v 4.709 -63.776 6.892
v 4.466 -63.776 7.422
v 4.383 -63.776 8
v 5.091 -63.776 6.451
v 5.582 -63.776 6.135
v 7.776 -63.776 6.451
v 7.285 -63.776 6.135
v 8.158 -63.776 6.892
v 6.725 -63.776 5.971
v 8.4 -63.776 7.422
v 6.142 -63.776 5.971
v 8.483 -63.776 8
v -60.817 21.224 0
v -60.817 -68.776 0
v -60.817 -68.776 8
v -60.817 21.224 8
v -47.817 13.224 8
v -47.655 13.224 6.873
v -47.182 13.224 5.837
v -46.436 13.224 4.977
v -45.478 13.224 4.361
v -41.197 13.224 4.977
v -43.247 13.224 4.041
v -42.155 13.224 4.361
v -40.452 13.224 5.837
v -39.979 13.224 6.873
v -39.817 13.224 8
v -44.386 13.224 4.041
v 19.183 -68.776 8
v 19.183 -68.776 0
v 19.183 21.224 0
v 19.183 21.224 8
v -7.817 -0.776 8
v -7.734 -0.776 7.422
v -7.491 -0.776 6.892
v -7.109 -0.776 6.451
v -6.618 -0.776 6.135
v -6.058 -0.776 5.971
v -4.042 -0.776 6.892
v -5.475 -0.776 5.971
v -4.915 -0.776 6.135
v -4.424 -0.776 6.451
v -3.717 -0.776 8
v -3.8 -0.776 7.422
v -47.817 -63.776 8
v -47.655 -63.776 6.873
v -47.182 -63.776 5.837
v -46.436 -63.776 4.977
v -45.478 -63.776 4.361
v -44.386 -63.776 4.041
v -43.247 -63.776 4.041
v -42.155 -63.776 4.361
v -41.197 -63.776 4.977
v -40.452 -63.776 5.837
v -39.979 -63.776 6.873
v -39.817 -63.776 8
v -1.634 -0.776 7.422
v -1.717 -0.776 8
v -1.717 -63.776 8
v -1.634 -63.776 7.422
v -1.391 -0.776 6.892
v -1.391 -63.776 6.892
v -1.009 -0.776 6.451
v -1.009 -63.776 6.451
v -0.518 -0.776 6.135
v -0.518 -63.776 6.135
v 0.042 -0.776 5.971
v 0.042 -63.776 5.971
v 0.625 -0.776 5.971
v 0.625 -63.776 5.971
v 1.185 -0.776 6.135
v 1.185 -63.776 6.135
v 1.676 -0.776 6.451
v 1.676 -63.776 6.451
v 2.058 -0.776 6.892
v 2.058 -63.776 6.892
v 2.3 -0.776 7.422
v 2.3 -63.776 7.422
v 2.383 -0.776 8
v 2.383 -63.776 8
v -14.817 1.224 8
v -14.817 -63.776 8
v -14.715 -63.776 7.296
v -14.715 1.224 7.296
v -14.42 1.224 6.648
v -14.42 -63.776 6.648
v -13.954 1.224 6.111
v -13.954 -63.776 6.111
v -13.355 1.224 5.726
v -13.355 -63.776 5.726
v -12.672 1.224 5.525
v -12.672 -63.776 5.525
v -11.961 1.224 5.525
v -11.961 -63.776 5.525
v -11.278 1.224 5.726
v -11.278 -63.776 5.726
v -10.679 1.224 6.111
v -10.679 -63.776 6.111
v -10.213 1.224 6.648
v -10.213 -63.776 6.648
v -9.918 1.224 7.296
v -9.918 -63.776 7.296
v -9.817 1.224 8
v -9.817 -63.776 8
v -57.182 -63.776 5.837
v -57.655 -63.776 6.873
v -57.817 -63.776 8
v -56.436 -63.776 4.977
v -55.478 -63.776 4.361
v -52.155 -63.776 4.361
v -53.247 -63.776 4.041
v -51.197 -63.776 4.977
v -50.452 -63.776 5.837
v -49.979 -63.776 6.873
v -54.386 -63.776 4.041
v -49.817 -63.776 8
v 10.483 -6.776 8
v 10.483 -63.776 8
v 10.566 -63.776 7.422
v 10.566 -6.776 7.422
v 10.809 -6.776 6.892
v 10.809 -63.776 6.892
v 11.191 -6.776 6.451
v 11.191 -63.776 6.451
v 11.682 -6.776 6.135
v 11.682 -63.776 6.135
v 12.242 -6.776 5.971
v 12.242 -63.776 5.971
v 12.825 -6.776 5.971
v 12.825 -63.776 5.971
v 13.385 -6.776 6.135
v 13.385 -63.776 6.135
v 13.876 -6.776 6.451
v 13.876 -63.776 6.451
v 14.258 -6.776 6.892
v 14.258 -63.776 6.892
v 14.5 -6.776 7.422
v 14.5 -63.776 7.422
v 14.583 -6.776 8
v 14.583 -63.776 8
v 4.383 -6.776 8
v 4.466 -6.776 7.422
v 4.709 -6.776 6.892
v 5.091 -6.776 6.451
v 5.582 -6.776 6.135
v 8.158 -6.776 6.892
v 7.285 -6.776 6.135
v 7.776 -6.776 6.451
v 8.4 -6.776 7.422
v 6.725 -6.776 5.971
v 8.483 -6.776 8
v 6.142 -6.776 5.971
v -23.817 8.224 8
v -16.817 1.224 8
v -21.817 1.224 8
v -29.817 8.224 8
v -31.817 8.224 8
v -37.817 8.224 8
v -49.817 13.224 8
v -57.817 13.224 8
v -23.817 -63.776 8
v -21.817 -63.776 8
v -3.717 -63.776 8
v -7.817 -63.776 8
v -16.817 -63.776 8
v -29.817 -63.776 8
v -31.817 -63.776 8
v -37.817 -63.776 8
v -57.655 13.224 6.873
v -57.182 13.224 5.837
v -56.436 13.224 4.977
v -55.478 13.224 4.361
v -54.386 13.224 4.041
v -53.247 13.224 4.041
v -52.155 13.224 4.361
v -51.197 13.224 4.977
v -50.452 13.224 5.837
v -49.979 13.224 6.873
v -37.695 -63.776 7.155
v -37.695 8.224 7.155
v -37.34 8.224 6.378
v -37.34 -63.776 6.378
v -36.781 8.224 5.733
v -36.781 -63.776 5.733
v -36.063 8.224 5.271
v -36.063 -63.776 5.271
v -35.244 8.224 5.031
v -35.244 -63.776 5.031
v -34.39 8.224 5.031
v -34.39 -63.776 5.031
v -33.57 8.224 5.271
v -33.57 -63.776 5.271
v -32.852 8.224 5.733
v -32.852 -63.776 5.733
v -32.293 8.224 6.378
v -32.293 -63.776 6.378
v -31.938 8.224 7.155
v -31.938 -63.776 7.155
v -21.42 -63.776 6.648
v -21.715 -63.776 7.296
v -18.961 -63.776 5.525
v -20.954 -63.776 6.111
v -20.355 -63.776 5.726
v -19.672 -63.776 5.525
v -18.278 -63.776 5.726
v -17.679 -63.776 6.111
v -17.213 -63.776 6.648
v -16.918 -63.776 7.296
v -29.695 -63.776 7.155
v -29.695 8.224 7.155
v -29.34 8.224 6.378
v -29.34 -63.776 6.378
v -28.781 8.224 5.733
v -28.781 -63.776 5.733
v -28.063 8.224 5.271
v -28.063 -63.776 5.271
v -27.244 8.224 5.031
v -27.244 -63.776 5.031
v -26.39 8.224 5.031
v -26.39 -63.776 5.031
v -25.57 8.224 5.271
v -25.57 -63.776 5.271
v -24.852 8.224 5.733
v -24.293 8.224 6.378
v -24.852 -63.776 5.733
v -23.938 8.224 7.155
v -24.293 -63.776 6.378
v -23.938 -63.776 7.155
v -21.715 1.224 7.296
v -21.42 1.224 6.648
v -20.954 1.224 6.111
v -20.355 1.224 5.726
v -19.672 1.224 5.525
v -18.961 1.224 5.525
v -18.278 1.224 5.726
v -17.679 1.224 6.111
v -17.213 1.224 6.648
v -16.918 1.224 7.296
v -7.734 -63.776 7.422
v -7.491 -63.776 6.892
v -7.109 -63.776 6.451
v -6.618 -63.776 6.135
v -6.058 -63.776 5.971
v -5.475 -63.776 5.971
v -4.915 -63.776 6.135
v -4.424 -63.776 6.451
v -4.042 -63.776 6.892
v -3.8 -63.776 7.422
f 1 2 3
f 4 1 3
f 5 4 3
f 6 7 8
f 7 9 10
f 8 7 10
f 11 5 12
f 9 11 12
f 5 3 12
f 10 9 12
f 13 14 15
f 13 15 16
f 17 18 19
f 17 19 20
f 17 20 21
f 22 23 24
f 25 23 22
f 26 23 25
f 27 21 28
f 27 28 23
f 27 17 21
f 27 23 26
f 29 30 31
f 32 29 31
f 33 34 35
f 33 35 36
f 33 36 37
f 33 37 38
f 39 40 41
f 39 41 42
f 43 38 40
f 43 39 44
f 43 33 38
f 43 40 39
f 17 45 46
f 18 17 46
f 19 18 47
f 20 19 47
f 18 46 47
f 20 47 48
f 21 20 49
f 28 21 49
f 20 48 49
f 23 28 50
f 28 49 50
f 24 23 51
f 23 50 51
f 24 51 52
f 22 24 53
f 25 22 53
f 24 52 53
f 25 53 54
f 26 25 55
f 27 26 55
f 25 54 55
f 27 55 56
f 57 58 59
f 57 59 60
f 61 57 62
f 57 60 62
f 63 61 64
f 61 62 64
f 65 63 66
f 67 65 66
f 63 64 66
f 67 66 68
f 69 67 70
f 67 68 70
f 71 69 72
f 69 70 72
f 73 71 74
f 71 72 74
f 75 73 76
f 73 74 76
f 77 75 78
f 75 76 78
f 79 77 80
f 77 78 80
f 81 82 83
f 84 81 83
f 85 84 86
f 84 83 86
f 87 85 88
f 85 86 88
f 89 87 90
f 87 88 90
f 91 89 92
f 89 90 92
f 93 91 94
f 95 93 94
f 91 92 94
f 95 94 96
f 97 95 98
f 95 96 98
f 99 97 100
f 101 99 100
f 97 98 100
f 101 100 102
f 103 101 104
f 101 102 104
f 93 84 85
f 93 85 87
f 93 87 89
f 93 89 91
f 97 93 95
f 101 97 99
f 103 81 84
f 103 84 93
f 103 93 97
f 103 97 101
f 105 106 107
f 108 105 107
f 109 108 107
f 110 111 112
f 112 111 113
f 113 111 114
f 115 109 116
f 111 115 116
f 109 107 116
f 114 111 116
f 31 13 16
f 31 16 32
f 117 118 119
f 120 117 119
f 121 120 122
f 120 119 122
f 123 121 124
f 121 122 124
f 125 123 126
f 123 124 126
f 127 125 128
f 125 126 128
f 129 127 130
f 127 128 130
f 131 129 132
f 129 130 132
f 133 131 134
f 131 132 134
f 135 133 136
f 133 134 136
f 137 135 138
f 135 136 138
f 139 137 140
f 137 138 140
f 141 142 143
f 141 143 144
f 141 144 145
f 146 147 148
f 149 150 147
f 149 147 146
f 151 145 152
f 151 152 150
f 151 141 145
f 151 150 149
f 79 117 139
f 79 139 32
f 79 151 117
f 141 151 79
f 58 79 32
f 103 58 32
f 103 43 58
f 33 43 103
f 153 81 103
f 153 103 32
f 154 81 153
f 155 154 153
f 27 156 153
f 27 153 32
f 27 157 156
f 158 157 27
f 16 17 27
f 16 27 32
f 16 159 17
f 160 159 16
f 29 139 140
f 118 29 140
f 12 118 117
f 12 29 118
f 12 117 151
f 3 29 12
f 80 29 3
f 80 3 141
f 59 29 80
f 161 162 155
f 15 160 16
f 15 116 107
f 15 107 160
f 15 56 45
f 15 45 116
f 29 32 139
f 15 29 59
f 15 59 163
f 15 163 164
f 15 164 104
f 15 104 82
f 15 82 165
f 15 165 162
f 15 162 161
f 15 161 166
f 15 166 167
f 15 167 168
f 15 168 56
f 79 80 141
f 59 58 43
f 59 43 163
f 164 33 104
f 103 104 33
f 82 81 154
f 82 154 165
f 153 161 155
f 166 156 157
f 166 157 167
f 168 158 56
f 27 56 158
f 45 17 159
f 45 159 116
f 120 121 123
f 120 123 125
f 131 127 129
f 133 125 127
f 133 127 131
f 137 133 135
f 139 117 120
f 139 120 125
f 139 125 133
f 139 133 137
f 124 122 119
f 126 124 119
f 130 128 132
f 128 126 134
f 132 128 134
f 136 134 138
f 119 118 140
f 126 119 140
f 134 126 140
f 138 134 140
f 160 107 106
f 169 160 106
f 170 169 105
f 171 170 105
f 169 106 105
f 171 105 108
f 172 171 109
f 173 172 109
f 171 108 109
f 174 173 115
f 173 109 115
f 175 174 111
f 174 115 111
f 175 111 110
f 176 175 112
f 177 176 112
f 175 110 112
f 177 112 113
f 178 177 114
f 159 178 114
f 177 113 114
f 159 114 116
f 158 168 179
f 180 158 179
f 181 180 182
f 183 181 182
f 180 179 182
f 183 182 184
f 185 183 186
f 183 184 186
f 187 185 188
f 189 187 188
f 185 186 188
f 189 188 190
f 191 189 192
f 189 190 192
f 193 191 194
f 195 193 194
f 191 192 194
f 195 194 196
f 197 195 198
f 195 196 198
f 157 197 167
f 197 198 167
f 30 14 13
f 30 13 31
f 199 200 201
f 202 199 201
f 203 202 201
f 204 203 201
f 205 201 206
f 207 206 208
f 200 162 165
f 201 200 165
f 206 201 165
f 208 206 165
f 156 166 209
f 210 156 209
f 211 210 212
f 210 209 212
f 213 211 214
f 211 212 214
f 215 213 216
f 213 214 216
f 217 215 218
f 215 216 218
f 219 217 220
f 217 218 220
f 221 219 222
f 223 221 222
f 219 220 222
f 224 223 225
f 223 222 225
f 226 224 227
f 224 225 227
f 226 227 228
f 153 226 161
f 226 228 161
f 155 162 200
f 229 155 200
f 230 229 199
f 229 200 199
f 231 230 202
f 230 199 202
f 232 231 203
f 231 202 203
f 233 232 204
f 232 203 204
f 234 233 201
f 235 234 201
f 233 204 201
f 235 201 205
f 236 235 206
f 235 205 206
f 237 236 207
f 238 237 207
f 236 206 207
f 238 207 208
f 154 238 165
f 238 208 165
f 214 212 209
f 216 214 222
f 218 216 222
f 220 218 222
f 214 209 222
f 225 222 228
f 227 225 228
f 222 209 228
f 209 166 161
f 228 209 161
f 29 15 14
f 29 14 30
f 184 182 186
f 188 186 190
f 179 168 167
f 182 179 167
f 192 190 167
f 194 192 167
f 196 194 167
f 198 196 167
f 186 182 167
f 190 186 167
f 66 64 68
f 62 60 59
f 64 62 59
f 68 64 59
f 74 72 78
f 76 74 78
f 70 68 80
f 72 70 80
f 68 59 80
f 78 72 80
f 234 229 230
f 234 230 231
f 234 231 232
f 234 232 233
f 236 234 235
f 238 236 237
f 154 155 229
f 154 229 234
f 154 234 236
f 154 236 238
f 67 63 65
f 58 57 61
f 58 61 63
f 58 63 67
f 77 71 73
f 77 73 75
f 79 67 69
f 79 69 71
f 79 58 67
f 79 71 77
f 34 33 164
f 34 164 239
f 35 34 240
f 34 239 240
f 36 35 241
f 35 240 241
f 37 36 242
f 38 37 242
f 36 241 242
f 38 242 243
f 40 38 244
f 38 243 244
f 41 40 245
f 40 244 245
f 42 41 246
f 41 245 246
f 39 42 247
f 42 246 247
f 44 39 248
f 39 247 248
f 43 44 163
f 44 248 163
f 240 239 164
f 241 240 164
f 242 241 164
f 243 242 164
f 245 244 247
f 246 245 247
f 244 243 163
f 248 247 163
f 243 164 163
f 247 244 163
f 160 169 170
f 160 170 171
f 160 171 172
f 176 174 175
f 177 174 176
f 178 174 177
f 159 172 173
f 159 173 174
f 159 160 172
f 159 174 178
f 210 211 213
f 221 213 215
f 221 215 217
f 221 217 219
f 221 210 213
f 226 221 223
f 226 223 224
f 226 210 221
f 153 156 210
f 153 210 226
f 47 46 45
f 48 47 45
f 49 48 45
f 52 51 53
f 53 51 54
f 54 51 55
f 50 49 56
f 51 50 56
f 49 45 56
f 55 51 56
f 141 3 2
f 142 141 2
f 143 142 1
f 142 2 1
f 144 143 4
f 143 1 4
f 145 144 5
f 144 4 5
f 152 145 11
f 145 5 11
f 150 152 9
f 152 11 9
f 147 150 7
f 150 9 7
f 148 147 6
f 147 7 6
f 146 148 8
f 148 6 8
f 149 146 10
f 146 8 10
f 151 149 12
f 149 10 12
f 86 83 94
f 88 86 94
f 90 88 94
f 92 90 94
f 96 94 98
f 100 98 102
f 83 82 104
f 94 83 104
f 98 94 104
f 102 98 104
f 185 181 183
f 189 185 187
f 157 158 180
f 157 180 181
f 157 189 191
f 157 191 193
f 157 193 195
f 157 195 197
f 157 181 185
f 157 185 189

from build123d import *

# Parameters (mm, degrees)
F0_W     = 80
F0_H     = 90
F1_DEPTH = 8
F3_DEPTH = 82
F4_DEPTH = 77
F5_DEPTH = 70
F6_DEPTH = 68
F7_DEPTH = 62
F8_DEPTH = 5


with BuildPart() as f1:
    # F0 (on Top) → F1 (new body)
    with BuildSketch(Plane.XY):
        with Locations((-20.8165652305, -23.7756354961)):
            Rectangle(F0_W, F0_H)
    extrude(amount=F1_DEPTH)

    # F2 (on face) → F3 (cut)
    with BuildSketch(Plane.XZ.offset(68.7756354961)):
        with BuildLine():
            ThreePointArc((-57.8165652305, 8), (-53.8165652305, 4), (-49.8165652305, 8))
            Line((-49.8165652305, 8), (-57.8165652305, 8))
        make_face()
        with BuildLine():
            Line((-39.8165652305, 8), (-47.8165652305, 8))
            ThreePointArc((-47.8165652305, 8), (-43.8165652305, 4), (-39.8165652305, 8))
        make_face()
    extrude(amount=-F3_DEPTH, mode=Mode.SUBTRACT)

    # F2 (on face) → F4 (cut)
    with BuildSketch(Plane.XZ.offset(68.7756354961)):
        with BuildLine():
            Line((-31.8165652305, 8), (-37.8165652305, 8))
            ThreePointArc((-37.8165652305, 8), (-34.8165652305, 5), (-31.8165652305, 8))
        make_face()
        with BuildLine():
            Line((-23.8165652305, 8), (-29.8165652305, 8))
            ThreePointArc((-29.8165652305, 8), (-26.8165652305, 5), (-23.8165652305, 8))
        make_face()
    extrude(amount=-F4_DEPTH, mode=Mode.SUBTRACT)

    # F2 (on face) → F5 (cut)
    with BuildSketch(Plane.XZ.offset(68.7756354961)):
        with BuildLine():
            Line((-16.8165652305, 8), (-21.8165652305, 8))
            ThreePointArc((-21.8165652305, 8), (-19.3165652305, 5.5), (-16.8165652305, 8))
        make_face()
        with BuildLine():
            Line((-9.8165652305, 8), (-14.8165652305, 8))
            ThreePointArc((-14.8165652305, 8), (-12.3165652305, 5.5), (-9.8165652305, 8))
        make_face()
    extrude(amount=-F5_DEPTH, mode=Mode.SUBTRACT)

    # F2 (on face) → F6 (cut)
    with BuildSketch(Plane.XZ.offset(68.7756354961)):
        with BuildLine():
            Line((-3.7165652305, 8), (-7.8165652305, 8))
            ThreePointArc((-7.8165652305, 8), (-5.7665652305, 5.95), (-3.7165652305, 8))
        make_face()
        with BuildLine():
            ThreePointArc((-1.7165652305, 8), (0.3334347695, 5.95), (2.3834347695, 8))
            Line((2.3834347695, 8), (-1.7165652305, 8))
        make_face()
    extrude(amount=-F6_DEPTH, mode=Mode.SUBTRACT)

    # F2 (on face) → F7 (cut)
    with BuildSketch(Plane.XZ.offset(68.7756354961)):
        with BuildLine():
            ThreePointArc((4.3834347695, 8), (6.4334347695, 5.95), (8.4834347695, 8))
            Line((8.4834347695, 8), (4.3834347695, 8))
        make_face()
        with BuildLine():
            ThreePointArc((10.4834347695, 8), (12.5334347695, 5.95), (14.5834347695, 8))
            Line((14.5834347695, 8), (10.4834347695, 8))
        make_face()
    extrude(amount=-F7_DEPTH, mode=Mode.SUBTRACT)

    # F2 (on face) → F8 (join)
    with BuildSketch(Plane.XZ.offset(68.7756354961)):
        with BuildLine():
            ThreePointArc((-57.8165652305, 8), (-53.8165652305, 4), (-49.8165652305, 8))
            Line((-49.8165652305, 8), (-57.8165652305, 8))
        make_face()
        with BuildLine():
            Line((-39.8165652305, 8), (-47.8165652305, 8))
            ThreePointArc((-47.8165652305, 8), (-43.8165652305, 4), (-39.8165652305, 8))
        make_face()
        with BuildLine():
            Line((-31.8165652305, 8), (-37.8165652305, 8))
            ThreePointArc((-37.8165652305, 8), (-34.8165652305, 5), (-31.8165652305, 8))
        make_face()
        with BuildLine():
            Line((-23.8165652305, 8), (-29.8165652305, 8))
            ThreePointArc((-29.8165652305, 8), (-26.8165652305, 5), (-23.8165652305, 8))
        make_face()
        with BuildLine():
            Line((-16.8165652305, 8), (-21.8165652305, 8))
            ThreePointArc((-21.8165652305, 8), (-19.3165652305, 5.5), (-16.8165652305, 8))
        make_face()
        with BuildLine():
            Line((-9.8165652305, 8), (-14.8165652305, 8))
            ThreePointArc((-14.8165652305, 8), (-12.3165652305, 5.5), (-9.8165652305, 8))
        make_face()
        with BuildLine():
            Line((-3.7165652305, 8), (-7.8165652305, 8))
            ThreePointArc((-7.8165652305, 8), (-5.7665652305, 5.95), (-3.7165652305, 8))
        make_face()
        with BuildLine():
            ThreePointArc((-1.7165652305, 8), (0.3334347695, 5.95), (2.3834347695, 8))
            Line((2.3834347695, 8), (-1.7165652305, 8))
        make_face()
        with BuildLine():
            ThreePointArc((4.3834347695, 8), (6.4334347695, 5.95), (8.4834347695, 8))
            Line((8.4834347695, 8), (4.3834347695, 8))
        make_face()
        with BuildLine():
            ThreePointArc((10.4834347695, 8), (12.5334347695, 5.95), (14.5834347695, 8))
            Line((14.5834347695, 8), (10.4834347695, 8))
        make_face()
    extrude(amount=-F8_DEPTH)


solid = f1.part
